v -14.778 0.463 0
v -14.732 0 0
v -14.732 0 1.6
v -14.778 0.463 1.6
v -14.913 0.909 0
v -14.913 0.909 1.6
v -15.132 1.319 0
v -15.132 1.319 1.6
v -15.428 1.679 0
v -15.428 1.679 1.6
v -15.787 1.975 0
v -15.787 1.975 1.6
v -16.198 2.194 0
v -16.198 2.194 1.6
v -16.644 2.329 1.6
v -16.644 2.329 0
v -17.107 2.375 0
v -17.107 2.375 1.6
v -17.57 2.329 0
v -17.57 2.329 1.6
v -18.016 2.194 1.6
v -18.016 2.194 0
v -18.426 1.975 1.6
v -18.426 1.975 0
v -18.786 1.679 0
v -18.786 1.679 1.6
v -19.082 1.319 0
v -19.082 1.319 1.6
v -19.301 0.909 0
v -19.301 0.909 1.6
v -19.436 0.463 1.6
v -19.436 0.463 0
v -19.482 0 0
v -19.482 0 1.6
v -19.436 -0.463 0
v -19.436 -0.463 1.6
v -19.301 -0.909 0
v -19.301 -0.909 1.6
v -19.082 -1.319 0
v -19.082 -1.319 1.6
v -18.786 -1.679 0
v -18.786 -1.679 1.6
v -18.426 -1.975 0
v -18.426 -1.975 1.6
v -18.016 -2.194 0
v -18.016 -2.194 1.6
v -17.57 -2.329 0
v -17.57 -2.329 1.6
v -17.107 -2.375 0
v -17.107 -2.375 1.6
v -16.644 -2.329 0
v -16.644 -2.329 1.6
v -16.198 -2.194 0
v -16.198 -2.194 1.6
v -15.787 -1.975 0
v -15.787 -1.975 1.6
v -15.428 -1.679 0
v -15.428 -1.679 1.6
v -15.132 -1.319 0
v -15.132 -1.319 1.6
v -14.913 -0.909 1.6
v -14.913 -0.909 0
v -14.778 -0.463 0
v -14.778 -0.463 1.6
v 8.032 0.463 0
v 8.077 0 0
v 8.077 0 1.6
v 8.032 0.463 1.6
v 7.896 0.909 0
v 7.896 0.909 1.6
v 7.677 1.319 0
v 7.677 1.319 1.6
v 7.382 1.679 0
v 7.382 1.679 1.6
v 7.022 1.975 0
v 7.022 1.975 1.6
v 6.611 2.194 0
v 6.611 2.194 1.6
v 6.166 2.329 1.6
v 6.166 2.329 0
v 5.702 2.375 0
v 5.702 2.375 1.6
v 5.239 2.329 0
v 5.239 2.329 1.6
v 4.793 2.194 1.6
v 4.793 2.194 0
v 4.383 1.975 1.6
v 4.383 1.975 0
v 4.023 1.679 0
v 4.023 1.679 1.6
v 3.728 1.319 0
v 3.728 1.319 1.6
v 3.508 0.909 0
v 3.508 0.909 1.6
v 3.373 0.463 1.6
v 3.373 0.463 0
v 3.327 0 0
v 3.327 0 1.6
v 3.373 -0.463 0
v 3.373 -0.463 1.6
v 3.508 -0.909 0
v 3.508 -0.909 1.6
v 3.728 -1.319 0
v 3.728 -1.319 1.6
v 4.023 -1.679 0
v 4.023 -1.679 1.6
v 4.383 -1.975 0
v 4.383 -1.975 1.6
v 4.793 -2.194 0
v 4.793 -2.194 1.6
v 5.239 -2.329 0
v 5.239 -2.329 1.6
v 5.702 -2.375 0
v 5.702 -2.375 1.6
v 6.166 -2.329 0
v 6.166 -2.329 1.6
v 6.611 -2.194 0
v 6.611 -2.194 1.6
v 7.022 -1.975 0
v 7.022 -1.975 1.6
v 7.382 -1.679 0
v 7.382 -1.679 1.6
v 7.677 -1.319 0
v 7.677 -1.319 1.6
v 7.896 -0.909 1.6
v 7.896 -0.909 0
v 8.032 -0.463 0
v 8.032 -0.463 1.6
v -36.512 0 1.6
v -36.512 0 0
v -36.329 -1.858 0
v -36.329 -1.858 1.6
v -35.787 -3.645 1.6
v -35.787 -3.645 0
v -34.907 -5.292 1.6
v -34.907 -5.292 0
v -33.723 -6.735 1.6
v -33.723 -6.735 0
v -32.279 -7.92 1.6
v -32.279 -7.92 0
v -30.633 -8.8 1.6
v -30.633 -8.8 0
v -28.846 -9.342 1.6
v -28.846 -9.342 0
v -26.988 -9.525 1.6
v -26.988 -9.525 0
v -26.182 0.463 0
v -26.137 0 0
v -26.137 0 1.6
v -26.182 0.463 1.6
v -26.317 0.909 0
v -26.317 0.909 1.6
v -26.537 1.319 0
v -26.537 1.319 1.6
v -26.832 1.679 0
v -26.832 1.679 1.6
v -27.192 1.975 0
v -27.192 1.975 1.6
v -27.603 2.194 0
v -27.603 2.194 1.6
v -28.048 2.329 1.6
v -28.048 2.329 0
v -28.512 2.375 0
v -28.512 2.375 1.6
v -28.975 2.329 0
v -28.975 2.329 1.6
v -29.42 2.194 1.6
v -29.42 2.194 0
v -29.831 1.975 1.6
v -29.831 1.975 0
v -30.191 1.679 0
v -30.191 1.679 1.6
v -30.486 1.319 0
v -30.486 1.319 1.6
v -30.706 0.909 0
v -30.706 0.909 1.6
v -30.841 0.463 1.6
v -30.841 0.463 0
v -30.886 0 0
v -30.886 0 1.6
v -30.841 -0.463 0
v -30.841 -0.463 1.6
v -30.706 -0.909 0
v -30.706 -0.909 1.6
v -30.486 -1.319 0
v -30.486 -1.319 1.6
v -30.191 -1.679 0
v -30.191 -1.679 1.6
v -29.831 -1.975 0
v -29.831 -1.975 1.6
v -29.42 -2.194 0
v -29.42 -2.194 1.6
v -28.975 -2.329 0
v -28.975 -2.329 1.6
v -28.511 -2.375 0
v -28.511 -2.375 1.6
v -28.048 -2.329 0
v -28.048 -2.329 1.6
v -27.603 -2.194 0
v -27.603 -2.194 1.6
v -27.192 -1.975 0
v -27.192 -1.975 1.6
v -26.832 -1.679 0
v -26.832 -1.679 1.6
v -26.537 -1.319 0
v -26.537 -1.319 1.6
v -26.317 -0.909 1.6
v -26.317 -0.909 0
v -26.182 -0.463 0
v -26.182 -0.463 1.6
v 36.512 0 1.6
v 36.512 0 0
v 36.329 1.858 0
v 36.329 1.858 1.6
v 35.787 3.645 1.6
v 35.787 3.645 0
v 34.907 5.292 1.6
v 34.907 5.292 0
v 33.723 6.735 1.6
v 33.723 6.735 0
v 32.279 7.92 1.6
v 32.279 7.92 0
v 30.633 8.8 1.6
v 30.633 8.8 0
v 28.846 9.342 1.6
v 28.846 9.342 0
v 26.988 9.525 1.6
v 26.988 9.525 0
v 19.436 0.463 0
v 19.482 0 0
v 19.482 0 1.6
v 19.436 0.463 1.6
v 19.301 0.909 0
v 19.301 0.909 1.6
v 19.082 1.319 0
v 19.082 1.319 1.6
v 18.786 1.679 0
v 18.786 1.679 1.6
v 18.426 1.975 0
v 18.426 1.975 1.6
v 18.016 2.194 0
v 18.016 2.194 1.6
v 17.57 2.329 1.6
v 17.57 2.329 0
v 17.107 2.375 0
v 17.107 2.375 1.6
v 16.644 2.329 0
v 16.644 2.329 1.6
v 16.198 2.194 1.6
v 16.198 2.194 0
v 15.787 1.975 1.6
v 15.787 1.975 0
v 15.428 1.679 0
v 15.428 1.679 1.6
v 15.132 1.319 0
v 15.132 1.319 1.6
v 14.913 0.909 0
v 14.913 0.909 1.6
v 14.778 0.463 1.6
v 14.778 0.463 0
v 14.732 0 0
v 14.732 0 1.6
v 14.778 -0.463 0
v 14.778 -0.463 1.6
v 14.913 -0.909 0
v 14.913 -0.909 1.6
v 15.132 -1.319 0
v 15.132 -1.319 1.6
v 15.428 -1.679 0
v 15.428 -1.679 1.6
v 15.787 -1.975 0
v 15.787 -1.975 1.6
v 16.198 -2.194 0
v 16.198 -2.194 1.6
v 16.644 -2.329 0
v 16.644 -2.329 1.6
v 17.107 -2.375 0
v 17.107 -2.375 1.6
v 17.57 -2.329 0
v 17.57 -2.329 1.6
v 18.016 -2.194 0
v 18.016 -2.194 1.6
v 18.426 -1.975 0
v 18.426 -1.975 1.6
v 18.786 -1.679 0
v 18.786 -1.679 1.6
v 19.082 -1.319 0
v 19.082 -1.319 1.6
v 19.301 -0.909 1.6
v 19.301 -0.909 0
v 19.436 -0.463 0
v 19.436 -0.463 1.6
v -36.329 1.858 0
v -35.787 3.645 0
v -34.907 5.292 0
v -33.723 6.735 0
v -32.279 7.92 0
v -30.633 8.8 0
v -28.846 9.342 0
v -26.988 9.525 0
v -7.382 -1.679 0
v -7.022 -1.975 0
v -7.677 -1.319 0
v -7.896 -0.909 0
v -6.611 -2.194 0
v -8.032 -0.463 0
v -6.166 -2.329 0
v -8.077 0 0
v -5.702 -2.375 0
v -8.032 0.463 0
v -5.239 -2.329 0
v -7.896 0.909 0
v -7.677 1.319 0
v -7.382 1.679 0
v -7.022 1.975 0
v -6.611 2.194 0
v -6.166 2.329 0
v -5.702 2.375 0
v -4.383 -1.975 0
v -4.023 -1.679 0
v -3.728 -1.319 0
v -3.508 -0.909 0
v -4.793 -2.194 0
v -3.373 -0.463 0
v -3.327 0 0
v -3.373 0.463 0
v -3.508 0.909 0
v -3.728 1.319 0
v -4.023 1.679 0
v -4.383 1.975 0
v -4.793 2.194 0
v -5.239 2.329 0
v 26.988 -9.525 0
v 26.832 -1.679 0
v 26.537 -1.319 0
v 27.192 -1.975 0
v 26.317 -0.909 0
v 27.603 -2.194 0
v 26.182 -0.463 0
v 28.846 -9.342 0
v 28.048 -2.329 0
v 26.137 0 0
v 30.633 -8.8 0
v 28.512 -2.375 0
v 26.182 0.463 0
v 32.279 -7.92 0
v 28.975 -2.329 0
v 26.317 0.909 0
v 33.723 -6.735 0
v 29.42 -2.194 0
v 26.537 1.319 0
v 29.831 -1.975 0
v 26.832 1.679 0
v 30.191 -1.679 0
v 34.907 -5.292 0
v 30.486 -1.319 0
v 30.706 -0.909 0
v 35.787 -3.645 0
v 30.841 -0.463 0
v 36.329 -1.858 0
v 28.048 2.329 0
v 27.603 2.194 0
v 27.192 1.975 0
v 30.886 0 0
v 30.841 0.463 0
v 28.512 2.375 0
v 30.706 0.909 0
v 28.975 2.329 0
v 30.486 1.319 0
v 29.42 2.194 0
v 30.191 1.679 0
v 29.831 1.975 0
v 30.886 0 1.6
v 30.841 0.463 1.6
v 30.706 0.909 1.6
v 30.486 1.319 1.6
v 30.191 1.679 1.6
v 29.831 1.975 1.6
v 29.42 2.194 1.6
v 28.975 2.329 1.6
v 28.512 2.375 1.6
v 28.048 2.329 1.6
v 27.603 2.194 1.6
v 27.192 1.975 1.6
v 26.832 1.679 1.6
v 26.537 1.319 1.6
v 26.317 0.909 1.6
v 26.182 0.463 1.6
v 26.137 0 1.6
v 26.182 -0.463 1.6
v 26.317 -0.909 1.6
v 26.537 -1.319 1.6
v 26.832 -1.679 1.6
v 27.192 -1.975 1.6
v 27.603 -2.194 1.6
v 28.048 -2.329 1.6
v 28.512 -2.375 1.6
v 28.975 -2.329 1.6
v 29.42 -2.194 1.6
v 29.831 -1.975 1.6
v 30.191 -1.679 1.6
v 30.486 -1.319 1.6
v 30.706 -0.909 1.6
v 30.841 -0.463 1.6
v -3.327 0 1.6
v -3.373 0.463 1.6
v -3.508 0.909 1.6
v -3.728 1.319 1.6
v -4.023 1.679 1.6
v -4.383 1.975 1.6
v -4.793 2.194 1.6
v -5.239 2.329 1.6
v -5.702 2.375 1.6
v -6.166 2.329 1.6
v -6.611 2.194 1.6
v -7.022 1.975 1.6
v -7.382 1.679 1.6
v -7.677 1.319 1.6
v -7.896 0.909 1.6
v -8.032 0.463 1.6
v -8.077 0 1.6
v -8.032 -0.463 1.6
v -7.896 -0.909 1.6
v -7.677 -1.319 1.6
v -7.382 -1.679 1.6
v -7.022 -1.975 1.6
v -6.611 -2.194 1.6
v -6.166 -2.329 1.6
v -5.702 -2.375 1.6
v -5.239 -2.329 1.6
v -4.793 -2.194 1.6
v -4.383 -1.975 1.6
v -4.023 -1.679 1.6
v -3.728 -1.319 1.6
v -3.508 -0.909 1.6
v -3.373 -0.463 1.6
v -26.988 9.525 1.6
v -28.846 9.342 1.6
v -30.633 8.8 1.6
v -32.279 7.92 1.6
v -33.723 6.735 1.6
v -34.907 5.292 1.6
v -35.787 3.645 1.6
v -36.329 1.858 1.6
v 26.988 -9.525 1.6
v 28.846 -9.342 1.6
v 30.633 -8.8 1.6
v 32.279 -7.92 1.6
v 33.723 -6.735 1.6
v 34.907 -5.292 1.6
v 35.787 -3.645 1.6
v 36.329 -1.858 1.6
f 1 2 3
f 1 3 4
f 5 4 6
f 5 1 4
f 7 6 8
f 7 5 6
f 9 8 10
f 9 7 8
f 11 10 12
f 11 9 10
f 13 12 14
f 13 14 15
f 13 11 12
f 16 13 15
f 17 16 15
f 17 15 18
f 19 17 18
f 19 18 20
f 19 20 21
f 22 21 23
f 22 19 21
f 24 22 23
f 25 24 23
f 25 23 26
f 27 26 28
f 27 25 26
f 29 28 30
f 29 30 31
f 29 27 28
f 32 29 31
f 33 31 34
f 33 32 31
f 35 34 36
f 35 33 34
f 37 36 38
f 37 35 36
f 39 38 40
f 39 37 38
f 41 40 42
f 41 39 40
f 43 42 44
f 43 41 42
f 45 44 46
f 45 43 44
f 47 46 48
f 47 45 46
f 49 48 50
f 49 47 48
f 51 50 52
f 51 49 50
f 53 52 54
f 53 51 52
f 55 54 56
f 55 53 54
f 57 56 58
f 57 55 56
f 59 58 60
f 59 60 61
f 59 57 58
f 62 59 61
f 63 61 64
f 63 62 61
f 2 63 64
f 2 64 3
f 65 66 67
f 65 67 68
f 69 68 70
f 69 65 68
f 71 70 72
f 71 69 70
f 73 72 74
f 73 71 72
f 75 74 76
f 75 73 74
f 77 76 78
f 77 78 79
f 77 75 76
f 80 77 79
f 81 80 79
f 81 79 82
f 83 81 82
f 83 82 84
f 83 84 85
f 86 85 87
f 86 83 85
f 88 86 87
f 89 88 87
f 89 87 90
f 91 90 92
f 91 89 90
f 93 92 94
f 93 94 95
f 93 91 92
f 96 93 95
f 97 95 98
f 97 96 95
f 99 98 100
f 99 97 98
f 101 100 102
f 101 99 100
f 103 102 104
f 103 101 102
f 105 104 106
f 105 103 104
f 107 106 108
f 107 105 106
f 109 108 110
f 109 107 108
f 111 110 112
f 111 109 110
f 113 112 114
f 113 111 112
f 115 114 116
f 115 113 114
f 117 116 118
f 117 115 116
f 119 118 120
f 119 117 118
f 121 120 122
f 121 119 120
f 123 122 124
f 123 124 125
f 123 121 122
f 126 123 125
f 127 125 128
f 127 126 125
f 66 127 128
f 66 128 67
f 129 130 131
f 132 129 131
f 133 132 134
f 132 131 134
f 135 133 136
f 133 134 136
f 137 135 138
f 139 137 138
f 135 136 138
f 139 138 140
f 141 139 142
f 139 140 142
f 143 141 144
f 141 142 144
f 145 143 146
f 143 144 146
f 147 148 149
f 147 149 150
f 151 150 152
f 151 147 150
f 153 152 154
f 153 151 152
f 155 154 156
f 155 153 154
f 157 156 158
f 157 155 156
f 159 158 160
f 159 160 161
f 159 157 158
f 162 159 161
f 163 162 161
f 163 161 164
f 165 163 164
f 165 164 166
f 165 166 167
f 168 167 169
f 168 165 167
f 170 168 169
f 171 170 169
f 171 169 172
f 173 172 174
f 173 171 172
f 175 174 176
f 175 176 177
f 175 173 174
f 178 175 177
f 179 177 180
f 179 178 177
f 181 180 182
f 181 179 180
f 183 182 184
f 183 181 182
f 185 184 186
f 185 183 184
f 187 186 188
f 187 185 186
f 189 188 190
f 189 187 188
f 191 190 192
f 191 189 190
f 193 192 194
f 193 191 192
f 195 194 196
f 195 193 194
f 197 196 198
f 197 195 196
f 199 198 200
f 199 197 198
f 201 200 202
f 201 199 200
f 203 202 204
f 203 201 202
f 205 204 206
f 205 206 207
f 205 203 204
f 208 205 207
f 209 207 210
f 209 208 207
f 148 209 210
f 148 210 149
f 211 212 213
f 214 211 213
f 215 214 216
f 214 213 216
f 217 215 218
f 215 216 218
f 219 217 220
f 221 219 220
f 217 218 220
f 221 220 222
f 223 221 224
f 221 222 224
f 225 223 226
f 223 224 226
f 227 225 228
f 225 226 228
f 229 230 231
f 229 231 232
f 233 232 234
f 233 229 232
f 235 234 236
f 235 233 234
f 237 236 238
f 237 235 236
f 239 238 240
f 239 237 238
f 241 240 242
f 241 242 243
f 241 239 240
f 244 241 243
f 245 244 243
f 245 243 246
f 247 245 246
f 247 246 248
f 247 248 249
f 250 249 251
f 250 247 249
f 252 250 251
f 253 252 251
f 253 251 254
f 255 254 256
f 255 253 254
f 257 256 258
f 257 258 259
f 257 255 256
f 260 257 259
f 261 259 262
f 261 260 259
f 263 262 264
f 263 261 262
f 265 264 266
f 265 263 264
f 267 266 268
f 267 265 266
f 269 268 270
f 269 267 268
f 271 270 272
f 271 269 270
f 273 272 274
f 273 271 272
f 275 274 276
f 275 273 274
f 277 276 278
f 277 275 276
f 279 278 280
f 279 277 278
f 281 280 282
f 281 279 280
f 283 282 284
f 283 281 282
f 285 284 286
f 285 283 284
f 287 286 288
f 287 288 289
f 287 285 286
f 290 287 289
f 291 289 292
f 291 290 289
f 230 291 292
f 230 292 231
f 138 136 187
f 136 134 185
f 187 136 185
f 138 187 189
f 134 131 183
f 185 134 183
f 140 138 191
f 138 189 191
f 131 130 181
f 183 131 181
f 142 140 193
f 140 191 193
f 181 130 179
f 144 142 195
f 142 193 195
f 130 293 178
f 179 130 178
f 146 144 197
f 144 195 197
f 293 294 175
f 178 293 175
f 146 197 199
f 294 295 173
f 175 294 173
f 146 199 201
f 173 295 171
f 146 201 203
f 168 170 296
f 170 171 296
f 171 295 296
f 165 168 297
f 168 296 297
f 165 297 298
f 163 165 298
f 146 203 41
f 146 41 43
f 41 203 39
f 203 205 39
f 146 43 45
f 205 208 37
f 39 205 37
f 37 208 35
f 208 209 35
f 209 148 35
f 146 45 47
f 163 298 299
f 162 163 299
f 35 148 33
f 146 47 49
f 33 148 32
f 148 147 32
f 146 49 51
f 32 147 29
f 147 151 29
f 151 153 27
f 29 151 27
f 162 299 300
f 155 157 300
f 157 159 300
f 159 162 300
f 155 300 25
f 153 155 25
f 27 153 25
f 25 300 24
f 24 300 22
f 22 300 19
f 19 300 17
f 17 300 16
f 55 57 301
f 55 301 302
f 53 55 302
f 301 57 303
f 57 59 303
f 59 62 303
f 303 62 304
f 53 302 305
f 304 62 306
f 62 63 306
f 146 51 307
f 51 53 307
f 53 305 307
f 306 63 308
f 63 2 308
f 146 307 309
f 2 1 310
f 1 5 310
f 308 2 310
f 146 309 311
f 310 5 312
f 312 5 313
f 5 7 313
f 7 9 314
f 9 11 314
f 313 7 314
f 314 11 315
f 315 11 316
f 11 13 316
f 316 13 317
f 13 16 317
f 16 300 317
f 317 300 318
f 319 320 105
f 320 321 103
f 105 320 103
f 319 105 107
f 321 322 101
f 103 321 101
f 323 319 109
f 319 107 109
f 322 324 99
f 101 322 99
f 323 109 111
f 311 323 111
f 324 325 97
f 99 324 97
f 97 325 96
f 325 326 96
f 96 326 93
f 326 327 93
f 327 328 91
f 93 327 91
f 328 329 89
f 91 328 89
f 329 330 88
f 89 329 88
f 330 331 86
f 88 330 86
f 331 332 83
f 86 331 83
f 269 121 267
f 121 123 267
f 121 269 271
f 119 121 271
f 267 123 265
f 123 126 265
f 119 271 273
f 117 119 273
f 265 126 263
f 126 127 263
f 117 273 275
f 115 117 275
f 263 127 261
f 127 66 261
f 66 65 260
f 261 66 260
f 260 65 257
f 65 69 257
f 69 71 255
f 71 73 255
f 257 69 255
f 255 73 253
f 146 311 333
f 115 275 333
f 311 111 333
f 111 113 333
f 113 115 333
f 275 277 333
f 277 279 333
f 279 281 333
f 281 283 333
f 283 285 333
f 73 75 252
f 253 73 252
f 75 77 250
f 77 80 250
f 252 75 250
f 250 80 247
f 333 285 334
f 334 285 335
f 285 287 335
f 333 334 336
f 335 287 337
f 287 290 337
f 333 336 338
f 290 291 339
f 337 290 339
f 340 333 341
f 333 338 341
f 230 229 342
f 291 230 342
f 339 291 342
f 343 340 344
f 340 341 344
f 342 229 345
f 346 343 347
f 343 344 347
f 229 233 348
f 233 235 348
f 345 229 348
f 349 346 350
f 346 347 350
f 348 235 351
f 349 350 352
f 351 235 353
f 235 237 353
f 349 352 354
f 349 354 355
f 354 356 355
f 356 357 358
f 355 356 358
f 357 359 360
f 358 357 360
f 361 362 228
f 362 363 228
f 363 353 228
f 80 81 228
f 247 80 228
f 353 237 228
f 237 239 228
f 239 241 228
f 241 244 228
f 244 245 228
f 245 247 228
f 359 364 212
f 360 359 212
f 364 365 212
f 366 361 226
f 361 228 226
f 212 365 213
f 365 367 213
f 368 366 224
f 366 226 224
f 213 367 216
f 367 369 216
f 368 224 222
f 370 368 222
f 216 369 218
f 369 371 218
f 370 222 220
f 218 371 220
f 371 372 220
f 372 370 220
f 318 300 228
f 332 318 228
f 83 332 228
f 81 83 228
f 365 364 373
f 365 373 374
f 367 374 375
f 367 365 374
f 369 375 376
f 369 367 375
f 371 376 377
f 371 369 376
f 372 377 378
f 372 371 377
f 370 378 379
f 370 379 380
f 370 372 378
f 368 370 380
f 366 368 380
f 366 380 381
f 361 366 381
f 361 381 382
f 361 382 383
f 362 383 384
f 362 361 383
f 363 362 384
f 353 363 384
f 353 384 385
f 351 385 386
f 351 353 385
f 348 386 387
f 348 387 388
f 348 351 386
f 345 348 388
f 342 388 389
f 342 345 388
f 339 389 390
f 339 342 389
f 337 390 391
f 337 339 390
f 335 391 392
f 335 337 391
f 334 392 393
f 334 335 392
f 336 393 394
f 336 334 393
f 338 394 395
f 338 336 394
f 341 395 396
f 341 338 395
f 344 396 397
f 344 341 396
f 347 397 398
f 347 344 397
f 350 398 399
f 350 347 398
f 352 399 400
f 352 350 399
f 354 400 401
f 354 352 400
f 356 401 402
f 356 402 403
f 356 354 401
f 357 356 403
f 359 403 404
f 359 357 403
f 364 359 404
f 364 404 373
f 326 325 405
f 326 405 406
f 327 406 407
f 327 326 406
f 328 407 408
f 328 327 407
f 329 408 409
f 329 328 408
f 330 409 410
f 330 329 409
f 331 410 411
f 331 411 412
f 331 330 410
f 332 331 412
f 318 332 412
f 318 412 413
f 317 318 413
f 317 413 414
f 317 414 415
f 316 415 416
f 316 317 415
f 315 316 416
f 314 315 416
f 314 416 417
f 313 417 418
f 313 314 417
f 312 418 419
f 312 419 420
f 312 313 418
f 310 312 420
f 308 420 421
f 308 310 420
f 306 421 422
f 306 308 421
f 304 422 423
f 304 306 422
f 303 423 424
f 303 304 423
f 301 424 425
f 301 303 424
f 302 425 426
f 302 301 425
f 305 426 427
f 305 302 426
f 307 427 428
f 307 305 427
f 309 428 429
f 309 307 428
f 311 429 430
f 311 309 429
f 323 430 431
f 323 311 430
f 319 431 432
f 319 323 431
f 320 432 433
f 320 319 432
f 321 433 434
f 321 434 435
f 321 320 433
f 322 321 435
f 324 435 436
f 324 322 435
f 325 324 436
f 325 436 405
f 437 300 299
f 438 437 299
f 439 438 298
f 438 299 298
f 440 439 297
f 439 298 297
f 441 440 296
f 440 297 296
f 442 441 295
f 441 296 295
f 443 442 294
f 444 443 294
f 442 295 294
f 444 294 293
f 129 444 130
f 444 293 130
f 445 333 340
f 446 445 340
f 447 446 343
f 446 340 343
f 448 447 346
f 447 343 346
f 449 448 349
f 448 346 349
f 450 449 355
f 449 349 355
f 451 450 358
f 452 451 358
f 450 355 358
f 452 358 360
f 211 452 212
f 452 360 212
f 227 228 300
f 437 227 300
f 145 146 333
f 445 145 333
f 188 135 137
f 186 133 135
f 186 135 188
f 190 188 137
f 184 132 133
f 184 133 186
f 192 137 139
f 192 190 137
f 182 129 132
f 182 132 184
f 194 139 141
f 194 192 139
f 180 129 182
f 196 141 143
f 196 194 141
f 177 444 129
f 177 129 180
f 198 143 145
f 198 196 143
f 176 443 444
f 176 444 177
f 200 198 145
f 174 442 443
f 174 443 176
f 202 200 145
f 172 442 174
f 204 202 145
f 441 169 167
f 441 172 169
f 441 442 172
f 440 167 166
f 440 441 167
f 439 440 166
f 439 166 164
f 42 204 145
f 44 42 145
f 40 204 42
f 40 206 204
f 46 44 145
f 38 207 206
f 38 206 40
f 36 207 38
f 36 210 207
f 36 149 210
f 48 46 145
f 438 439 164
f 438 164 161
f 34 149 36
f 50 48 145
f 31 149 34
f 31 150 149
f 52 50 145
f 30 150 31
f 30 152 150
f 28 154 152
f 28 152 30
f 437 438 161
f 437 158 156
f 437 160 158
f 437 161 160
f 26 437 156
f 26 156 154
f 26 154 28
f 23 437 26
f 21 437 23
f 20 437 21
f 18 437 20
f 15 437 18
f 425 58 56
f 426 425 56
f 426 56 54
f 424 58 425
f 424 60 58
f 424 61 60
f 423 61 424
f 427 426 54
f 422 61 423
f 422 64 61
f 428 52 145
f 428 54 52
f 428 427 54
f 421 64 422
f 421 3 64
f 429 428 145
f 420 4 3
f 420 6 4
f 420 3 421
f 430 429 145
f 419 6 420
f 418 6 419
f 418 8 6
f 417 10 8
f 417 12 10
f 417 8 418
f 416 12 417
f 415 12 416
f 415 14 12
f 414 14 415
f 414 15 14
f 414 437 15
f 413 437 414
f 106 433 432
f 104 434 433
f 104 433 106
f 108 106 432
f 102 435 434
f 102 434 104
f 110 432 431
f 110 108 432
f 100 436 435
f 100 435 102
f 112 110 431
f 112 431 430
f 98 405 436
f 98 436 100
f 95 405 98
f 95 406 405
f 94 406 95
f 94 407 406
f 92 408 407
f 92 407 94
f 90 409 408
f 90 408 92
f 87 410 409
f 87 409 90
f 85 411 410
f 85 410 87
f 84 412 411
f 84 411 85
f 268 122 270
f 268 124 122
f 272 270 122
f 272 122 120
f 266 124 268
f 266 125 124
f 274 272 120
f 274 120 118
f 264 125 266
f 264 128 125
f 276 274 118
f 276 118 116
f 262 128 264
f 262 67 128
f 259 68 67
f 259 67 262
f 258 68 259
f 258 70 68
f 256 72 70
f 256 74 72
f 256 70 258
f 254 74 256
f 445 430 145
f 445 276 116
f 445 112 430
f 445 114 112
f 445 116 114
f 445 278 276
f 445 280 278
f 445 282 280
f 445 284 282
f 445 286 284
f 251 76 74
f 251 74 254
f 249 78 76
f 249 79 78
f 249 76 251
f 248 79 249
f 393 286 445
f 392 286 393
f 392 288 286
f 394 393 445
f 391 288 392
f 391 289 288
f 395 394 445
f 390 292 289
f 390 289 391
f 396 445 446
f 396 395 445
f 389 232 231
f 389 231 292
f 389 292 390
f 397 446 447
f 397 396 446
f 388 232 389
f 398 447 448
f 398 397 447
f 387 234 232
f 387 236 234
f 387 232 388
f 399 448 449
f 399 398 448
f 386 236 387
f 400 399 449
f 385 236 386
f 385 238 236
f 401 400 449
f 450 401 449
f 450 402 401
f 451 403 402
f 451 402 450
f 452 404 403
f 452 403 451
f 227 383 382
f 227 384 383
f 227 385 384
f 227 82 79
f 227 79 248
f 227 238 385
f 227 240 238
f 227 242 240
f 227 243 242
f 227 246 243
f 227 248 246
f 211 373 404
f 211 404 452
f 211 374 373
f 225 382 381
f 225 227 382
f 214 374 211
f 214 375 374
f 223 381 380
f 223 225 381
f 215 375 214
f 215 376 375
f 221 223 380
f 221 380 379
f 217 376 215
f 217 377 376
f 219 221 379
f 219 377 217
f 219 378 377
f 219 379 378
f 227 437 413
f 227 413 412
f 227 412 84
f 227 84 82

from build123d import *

# Parameters (mm, degrees)
F0_R     = 2.3749
F1_DEPTH = 1.6002


with BuildPart() as f1:
    # F0 (on Top) → F1 (new body)
    with BuildSketch(Plane.XY):
        with BuildLine():
            Line((26.9875, 9.525), (0, 9.525))
            Line((0, 9.525), (-26.9875, 9.525))
            ThreePointArc((-26.9875, 9.525), (-33.722692, 6.735192), (-36.5125, 0))
            ThreePointArc((-36.5125, 0), (-33.722692, -6.735192), (-26.9875, -9.525))
            Line((-26.9875, -9.525), (0, -9.525))
            Line((0, -9.525), (26.9875, -9.525))
            ThreePointArc((26.9875, -9.525), (33.722692, -6.735192), (36.5125, 0))
            ThreePointArc((36.5125, 0), (33.722692, 6.735192), (26.9875, 9.525))
        make_face()
        with Locations((-28.5115, 0)):
            Circle(F0_R, mode=Mode.SUBTRACT)
        with Locations((-17.1069, 0)):
            Circle(F0_R, mode=Mode.SUBTRACT)
        with Locations((-5.7023, 0)):
            Circle(F0_R, mode=Mode.SUBTRACT)
        with Locations((5.7023, 0)):
            Circle(F0_R, mode=Mode.SUBTRACT)
        with Locations((17.1069, 0)):
            Circle(F0_R, mode=Mode.SUBTRACT)
        with Locations((28.5115, 0)):
            Circle(F0_R, mode=Mode.SUBTRACT)
    extrude(amount=F1_DEPTH)


solid = f1.part
